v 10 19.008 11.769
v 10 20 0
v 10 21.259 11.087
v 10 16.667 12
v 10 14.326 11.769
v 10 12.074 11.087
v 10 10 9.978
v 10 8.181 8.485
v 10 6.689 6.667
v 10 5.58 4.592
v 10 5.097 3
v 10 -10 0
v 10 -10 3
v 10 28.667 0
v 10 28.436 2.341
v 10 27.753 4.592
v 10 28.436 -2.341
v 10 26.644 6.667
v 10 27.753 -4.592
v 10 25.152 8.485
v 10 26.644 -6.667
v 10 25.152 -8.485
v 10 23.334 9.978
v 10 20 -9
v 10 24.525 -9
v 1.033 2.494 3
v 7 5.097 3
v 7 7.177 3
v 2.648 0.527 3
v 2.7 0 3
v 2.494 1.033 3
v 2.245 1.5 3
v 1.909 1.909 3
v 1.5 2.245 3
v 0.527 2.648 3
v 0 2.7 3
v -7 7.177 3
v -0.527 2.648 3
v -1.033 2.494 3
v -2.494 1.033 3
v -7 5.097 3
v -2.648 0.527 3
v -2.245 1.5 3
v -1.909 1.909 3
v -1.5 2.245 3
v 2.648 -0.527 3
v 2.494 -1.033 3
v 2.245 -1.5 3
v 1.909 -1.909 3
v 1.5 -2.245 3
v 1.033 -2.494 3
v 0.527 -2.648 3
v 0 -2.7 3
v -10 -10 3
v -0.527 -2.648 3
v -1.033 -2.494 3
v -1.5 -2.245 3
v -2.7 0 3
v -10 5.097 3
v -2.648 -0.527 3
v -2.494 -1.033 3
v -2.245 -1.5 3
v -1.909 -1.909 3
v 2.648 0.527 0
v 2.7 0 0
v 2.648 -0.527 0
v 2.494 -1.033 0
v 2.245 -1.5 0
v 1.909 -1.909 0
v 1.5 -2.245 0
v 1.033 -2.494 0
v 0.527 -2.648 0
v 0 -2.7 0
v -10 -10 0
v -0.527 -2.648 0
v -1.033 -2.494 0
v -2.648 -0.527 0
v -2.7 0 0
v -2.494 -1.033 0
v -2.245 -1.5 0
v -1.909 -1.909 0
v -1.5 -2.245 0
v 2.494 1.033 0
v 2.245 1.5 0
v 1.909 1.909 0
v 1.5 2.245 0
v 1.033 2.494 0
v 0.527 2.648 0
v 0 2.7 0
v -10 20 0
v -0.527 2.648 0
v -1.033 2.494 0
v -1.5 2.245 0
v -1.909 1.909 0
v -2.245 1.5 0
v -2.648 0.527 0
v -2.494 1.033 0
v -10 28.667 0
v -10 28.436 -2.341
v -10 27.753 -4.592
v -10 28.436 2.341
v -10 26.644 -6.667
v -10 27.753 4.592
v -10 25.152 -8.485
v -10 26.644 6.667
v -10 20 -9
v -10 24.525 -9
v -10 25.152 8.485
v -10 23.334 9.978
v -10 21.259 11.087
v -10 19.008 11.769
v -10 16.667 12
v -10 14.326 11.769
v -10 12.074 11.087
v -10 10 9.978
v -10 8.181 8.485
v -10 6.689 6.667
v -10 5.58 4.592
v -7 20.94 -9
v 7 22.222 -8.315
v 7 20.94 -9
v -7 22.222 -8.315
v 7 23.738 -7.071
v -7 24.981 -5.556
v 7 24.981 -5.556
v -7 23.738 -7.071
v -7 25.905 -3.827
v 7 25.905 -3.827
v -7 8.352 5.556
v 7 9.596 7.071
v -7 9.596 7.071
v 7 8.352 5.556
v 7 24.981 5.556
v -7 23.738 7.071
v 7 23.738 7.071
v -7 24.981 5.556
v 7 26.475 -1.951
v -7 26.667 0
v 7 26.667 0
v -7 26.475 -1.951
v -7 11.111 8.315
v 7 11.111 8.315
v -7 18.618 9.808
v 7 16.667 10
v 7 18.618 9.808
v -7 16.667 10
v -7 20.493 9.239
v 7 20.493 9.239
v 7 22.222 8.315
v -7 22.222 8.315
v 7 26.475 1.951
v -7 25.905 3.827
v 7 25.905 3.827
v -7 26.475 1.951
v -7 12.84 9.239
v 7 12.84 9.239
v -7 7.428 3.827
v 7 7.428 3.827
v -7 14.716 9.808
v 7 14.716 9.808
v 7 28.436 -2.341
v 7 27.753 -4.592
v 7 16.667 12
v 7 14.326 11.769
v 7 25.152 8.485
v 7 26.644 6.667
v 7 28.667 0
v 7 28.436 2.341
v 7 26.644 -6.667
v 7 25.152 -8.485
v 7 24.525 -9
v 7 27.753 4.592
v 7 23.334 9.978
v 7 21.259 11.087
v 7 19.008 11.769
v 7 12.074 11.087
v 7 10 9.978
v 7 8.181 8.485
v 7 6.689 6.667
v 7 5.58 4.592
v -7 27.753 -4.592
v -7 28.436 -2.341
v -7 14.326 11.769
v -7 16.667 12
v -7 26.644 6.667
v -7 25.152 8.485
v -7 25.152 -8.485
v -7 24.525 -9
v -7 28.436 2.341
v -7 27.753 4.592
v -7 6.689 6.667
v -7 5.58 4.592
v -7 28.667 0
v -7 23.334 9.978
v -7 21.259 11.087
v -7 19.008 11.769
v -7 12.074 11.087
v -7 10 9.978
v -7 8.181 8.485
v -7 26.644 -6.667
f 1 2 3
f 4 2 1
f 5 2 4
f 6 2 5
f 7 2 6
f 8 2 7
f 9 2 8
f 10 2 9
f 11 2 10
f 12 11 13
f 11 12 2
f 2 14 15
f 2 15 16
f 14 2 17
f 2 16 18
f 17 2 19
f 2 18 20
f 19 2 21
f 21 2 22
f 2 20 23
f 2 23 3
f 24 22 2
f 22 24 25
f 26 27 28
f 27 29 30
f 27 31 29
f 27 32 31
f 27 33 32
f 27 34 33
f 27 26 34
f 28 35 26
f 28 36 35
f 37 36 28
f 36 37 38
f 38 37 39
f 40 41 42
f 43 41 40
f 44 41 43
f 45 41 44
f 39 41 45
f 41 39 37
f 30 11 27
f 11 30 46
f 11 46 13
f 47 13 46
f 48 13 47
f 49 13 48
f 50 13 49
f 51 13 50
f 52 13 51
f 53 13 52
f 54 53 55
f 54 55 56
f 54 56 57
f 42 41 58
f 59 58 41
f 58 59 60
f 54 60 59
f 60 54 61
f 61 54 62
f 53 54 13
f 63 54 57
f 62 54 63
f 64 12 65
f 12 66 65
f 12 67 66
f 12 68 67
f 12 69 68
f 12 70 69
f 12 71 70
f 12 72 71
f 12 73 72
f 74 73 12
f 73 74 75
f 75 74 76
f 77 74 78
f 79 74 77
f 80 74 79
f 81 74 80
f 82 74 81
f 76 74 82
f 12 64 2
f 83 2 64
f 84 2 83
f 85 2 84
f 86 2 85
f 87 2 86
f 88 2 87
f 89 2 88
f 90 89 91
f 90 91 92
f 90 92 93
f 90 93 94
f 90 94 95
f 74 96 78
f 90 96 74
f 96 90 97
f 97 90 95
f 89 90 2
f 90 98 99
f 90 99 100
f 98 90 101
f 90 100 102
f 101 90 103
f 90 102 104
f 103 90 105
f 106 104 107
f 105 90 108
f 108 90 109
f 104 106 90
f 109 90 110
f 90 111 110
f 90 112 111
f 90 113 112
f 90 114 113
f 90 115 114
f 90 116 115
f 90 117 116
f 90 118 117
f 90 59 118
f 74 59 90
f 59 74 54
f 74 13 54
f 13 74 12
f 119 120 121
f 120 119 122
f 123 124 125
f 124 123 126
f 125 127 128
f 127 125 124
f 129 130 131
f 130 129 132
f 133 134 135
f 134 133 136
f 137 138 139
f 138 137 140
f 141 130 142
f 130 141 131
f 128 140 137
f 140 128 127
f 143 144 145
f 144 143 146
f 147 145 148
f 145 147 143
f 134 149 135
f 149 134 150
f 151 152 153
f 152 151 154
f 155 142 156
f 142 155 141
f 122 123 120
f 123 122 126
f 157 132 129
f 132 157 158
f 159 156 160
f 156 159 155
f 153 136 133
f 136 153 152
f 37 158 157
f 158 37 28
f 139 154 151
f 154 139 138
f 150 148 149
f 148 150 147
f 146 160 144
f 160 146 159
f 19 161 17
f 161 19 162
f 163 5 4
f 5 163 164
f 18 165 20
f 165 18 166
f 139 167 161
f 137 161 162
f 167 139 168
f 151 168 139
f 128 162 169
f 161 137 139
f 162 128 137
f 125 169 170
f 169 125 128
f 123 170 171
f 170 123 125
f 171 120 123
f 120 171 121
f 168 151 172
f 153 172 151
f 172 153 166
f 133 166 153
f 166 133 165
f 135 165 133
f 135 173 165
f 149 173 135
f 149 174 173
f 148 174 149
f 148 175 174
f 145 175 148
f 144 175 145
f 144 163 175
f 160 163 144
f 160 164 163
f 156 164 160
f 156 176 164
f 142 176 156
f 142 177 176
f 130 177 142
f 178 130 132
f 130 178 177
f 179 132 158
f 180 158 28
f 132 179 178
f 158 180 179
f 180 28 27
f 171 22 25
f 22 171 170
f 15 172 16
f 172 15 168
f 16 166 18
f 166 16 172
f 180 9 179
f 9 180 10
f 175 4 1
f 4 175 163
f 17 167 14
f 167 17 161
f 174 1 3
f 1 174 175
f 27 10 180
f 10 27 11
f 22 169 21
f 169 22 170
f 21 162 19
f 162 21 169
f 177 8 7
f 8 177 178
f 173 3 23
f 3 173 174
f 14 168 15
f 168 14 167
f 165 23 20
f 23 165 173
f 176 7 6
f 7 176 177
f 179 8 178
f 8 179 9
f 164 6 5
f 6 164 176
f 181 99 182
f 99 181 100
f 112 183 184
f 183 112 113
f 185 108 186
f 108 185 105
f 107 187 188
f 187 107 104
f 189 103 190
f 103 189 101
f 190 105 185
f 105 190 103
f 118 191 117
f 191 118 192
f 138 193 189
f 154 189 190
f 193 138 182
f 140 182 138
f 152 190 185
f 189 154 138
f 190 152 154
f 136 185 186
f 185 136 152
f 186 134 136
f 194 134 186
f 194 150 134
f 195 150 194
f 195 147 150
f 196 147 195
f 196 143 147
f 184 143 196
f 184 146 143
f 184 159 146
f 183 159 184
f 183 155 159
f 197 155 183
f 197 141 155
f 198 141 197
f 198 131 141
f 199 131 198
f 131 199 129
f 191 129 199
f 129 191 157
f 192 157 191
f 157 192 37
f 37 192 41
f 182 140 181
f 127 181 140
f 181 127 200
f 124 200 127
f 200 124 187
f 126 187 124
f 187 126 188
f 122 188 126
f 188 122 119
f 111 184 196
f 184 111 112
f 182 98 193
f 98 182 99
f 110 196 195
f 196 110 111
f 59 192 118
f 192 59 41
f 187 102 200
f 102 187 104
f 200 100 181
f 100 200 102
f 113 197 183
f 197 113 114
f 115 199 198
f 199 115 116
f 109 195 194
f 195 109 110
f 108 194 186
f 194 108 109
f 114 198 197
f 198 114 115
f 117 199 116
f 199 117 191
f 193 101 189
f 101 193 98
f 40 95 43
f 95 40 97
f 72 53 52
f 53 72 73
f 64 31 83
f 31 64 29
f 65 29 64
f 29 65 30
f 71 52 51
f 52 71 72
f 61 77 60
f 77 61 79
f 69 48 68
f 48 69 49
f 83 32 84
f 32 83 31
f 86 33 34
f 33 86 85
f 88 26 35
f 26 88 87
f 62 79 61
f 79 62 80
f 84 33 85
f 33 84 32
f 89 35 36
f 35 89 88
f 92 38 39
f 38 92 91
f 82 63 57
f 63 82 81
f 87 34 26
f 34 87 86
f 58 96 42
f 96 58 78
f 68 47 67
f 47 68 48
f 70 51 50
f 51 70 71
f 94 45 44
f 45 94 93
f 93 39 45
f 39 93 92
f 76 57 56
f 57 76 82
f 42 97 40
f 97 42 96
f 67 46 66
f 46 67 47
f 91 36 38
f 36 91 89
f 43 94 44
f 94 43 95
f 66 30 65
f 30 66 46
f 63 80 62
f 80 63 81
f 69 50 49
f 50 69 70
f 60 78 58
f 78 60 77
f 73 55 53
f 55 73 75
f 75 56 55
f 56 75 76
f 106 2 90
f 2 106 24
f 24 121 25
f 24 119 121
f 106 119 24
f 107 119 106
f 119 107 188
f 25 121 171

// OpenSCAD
// file: ../parameter.scad
//----------------Global Parameter---------------------------------------
nema17_height=40;
nema17_width=42;
nema17_shftDia=5;
nema17_shftLen=28;
nema17_holeDist=31;
Nema17_gearDia=23;

slotWthick=4;
//-------Parameter triplePytho------------------------------------------------

strScale=800;
strDia=3.5;
strPosX=20;
strPosY=-20;
slotXY=20;
nStr=3;


tuner_bDi=8;
tuner_bDo=22.2;
tuner_bZ=10;
tuner_rThick=5;
tuner_tDia=strPosX*2;// (big)
//tuner_tDia=tuner_bDo+8;// (small)
tuner_leverZ=10;
tuner_zPos=225;
tuner_strDia=strDia[0];
tuner_leverY=35;

//----------Kickup----------------------------------------------------

kickup_baseX=17;
kickup_baseY=13;
kickup_zAdjDia=3.3;
kickup_zAdjL=10;
kickup_zAdjDist=10.5;
kickup_zAdjOff=4;
//------------------------------------------------------------------------

slide_cpDst=1.5;
slide_rackPosX=(55-12.5);

m3Dia=3.3;
m3NutD=6.6;
m4Dia=4.3;
m4NutD=8.3;
m4NutZ=5;
m5Dia=5.3;
m5HeadD=9.6;

edgeR=3;

mnt_pcbA_X=157;
mnt_pcbA_Y=101;

//---------End Parameter triplePytho-----------------------------------------------


//-------Parameter GHarp----------------------------------------------------

//strScale=650;
//strDia=3;
//strPosX=20;
//strPosY=-20;
//slotXY=20;
//nStr=3;
//
//
//
//tuner_bDi=8;
//tuner_bDo=22.2;
//tuner_bZ=10;
//tuner_rThick=5;
////tuner_tDia=strPosX*2; (big)
//tuner_tDia=strPosX*2-10;
//tuner_leverZ=10;
//tuner_zPos=225;
//tuner_strDia=strDia[0];
//tuner_leverY=35;
//
////----------Kickup----------------------------------------------------
//
//kickup_baseX=17;
//kickup_baseY=13;
//kickup_zAdjDia=3.3;
//kickup_zAdjL=10;
//kickup_zAdjDist=10.5;
//kickup_zAdjOff=4;
////------------------------------------------------------------------------
//
//slide_cpDst=1.5;
//slide_rackPosX=(55-12.5);
//
//m3Dia=3.3;
//m3NutD=6.6;
//m4Dia=4.3;
//m4NutD=8.3;
//m4NutZ=5;
//m5Dia=5.3;
//m5HeadD=9.6;
//
//edgeR=3;
//
//gearXPos=57;
//gearYPos=0;
//gearZPos=360;
//
//rackScrD=20;
//rack_X=13;
//rack_Y=15.5;
//rack_extOffX=0;
//
//bearGearD=25;
//mntGrD=20.5; //mount gear distance
//
//mnt_pcbA_X=157;
//mnt_pcbA_Y=101;

//---------End Parameter GHarp-----------------------------------------------


//-------Parameter Bass----------------------------------------------------

//strScale=650;
//strDia=4;
//strPosX=20;
//strPosY=-20;
//slotXY=20;
//
//
//
//tuner_bDi=8;
//tuner_bDo=22.2;
//tuner_bZ=10;
//tuner_rThick=5;
////tuner_tDia=strPosX*2; (big)
//tuner_tDia=strPosX*2;
//tuner_leverZ=10;
//tuner_zPos=225;
//tuner_strDia=strDia[0];
//tuner_leverY=35;
//
////----------Kickup----------------------------------------------------
//
//
//kickup_baseX=22;
//kickup_baseY=15;
//kickup_zAdjDia=3.3;
//kickup_zAdjL=10;
//kickup_zAdjDist=13;
//kickup_zAdjOff=4;
//
//
//slide_cpDst=1.5;
//slide_rackPosX=(55-12.5);
//
//m3NutD=6.6;
//m4Dia=4.3;
//m4NutD=8.3;
//m5Dia=5.3;
//
//edgeR=3;
//
//gearXPos=57;
//gearYPos=0;
//gearZPos=360;
//
//rackScrD=20;
//rack_X=13;
//rack_Y=15.5;
//rack_extOffX=0;
//
//bearGearD=25;
//mntGrD=20.5; //mount gear distance
//
////---------End Bass-----------------------------------------------
// main file
include <../parameter.scad>

$fn=32;
srvWO=33;
srvWI=23;
srvD=12.5;

wt=2;

d=3;
h=slotXY+srvD+d;
w=srvWO+wt*2;


m5Dia=5;

screwMdia=3;
screwMHDia=5.5;
screwMHh=1.8;
screwMDist=28;

//mnt();
wireguide();

module wireguide(){
	difference(){
		union(){
			translate([0,0,0])rcube([slotXY,slotXY,d],0);
			translate([0,slotXY/1.2,0])rotate([0,90,0])cylinder(d=slotXY,h=slotXY,center=true);
			translate([slotXY/2-d/2,slotXY/1.2,0])rotate([0,90,0])cylinder(d=slotXY+4,h=d,center=true);
			translate([-slotXY/2+d/2,slotXY/1.2,0])rotate([0,90,0])cylinder(d=slotXY+4,h=d,center=true);

		}
		translate([0,0,0])cylinder(d=m5Dia+0.4,h=d*3,center=true);
		translate([0,0,-slotXY])rcube([slotXY+1,slotXY*2,slotXY],0);
		translate([0,0,-slotXY-9])rcube([slotXY+1,slotXY*4,slotXY],0);

	}
}

module mnt(){
difference(){
	union(){
		translate([0,h/2,0])rcube([w,h,d],0);
		translate([0,-d/2,0])rcube([w,d,slotXY+d],0);
	}
		translate([0,slotXY/2,0])cylinder(d=m5Dia+0.4,h=d*3,center=true);
		translate([0,0,d+slotXY/2])rotate([90,0,0])cylinder(d=m5Dia+0.4,h=d*3,center=true);
			
		translate([0,srvD/2+slotXY,-0.1])rcube([srvWI,srvD,d*2],0);
		translate([screwMDist/2,slotXY+srvD/2,d-screwMHh+0.01])cylinder(d1=screwMdia,d2=screwMHDia,h=screwMHh);
		translate([screwMDist/2,slotXY+srvD/2,-1])cylinder(d=screwMdia,h=d*2);
	
		translate([-screwMDist/2,slotXY+srvD/2,d-screwMHh+0.01])cylinder(d1=screwMdia,d2=screwMHDia,h=screwMHh);
		translate([-screwMDist/2,slotXY+srvD/2,-1])cylinder(d=screwMdia,h=d*2);
	}
}

module rcube(size,radius){
linear_extrude(height=size[2])
if(radius>0){
hull()
{
    // place 4 circles in the corners, with the given radius
    translate([(-size[0]/2)+(radius), (-size[1]/2)+(radius), 0])
    circle(r=radius);

    translate([(size[0]/2)-(radius), (-size[1]/2)+(radius), 0])
    circle(r=radius);

    translate([(-size[0]/2)+(radius), (size[1]/2)-(radius), 0])
    circle(r=radius);

    translate([(size[0]/2)-(radius), (size[1]/2)-(radius), 0])
    circle(r=radius);
}
}
if(radius==0){
translate([0,0,size[2]/2])cube(size,center=true);
}
}
